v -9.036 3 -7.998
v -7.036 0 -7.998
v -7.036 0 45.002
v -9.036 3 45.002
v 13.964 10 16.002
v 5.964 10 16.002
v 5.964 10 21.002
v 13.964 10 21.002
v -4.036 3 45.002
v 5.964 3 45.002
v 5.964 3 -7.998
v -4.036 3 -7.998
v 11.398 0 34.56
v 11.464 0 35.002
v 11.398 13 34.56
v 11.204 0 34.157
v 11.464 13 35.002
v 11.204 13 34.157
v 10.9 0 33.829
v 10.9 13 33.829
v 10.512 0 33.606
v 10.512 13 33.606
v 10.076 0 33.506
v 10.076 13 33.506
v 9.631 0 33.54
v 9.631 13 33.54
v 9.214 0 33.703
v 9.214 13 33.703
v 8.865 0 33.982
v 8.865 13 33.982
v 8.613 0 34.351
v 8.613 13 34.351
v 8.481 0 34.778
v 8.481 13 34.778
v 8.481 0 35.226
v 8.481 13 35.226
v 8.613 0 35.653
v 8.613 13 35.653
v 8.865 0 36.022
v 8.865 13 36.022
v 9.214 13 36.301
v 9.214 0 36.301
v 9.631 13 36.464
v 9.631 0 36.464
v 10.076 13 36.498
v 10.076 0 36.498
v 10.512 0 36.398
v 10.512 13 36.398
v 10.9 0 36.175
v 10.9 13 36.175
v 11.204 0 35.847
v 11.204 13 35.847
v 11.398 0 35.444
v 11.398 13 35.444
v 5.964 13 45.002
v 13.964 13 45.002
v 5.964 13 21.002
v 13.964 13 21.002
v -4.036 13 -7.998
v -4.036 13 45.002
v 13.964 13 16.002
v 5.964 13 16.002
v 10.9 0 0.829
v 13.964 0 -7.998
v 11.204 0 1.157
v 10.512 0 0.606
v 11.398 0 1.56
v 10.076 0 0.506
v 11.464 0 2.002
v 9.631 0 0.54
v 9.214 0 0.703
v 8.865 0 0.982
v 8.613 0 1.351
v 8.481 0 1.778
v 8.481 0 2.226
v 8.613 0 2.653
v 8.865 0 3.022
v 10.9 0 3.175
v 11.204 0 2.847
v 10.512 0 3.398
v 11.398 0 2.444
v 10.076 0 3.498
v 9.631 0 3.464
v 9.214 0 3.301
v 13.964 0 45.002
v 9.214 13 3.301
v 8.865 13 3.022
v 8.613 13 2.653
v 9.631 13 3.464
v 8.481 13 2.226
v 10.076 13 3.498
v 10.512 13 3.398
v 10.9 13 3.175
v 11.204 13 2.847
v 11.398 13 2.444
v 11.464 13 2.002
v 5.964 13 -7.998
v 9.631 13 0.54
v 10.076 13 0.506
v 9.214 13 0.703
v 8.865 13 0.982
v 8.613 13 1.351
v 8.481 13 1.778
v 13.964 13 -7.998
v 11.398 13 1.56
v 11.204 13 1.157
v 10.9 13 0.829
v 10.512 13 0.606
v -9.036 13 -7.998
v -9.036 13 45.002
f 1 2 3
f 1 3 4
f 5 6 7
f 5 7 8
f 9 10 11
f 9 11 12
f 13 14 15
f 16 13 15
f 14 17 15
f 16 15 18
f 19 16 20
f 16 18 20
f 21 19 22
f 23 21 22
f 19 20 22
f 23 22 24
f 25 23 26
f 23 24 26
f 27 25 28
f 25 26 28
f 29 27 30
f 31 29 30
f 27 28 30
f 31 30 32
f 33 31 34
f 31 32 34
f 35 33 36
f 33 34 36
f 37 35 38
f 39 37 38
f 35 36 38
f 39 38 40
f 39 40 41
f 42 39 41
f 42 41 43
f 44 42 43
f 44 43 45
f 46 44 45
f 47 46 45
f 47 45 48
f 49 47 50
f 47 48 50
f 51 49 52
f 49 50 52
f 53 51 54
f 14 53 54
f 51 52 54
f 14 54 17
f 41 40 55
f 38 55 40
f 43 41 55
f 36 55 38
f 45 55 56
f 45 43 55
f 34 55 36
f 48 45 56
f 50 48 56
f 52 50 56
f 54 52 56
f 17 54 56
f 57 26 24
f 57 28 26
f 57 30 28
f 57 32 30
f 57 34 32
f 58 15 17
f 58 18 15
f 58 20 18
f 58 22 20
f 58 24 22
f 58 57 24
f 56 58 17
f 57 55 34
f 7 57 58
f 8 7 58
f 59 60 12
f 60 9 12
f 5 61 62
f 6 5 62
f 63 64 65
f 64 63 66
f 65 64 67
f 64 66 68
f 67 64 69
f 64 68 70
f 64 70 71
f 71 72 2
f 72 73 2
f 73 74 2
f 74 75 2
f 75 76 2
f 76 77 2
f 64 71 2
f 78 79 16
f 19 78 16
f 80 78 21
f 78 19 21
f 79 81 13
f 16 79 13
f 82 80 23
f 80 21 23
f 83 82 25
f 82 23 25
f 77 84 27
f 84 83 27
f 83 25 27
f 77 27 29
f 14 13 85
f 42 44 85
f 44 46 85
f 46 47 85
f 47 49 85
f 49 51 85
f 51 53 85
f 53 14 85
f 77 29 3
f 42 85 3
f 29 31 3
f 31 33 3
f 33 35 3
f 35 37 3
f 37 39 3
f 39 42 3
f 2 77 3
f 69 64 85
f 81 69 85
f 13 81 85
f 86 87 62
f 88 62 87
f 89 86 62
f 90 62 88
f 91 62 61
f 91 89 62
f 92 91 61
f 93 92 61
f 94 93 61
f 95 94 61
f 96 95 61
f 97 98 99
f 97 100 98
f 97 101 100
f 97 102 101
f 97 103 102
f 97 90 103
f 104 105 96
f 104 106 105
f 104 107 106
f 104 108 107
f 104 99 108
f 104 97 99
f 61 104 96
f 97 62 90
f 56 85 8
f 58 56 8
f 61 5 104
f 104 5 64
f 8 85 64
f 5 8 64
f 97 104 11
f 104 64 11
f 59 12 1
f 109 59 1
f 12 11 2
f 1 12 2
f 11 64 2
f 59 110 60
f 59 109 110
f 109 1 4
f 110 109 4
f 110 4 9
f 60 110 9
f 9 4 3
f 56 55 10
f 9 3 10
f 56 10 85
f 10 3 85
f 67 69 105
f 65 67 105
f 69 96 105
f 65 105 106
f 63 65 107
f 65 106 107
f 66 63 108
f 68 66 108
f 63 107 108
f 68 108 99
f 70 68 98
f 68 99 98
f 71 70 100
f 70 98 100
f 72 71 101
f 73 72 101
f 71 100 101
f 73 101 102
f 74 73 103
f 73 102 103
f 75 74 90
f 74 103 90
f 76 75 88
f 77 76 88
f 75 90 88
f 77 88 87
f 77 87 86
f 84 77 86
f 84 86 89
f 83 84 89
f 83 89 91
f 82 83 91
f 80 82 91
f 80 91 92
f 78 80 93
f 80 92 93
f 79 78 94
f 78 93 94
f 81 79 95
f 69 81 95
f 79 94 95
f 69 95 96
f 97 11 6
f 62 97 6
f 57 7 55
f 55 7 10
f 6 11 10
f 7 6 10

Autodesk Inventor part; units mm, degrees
ref_plane "YZ Plane" through (0, 0, 0) normal (1, 0, 0) x (0, 1, 0)
ref_plane "XZ Plane" through (0, 0, 0) normal (0, 1, 0) x (-1, 0, 0)
ref_plane "XY Plane" through (0, 0, 0) normal (0, 0, 1) x (1, 0, 0)
sketch "Boceto1" plane through (0, 0, 0) normal (0, 1, 0) x (-1, 0, 0)
  line L0 (9.0356, 45.002) -> (-13.9644, 45.002)
  line L1 (-13.9644, 45.002) -> (-13.9644, -7.998)
  line L2 (-13.9644, -7.998) -> (9.0356, -7.998)
  line L3 (9.0356, -7.998) -> (9.0356, 45.002)
  point P0 (0, 0)
  dimension "d0" = 23
  dimension "d1" = 53
extrude "Extrusión1" add sketch "Boceto1" along normal blind 3
sketch "Boceto2" plane through (0, 3, 0) normal (0, 1, 0) x (1, 0, 0)
  line L0 (-9.0356, -45.002) -> (13.9644, -45.002) projected
  line L1 (13.9644, -45.002) -> (13.9644, 7.998) projected
  line L2 (5.9644, -45.002) -> (13.9644, -45.002)
  line L3 (13.9644, -45.002) -> (13.9644, 7.998)
  line L4 (13.9644, 7.998) -> (5.9644, 7.998)
  line L5 (5.9644, 7.998) -> (5.9644, -45.002)
  point P0 (0, 0)
  dimension "d4" = 8
extrude "Extrusión2" add sketch "Boceto2" along normal blind 10
sketch "Boceto3" plane through (0, 13, 0) normal (0, 1, 0) x (1, 0, 0)
  line L0 (5.9644, 7.998) -> (5.9644, -45.002) projected
  line L1 (5.9644, -21.002) -> (13.9831, -21.002)
  line L2 (13.9831, -21.002) -> (13.9831, -16.002)
  line L3 (13.9831, -16.002) -> (5.9644, -16.002)
  line L4 (5.9644, -16.002) -> (5.9644, -21.002)
  line L5 (13.9644, 7.998) -> (5.9644, 7.998) projected
  line L6 (5.9644, -45.002) -> (13.9644, -45.002) projected
  point P0 (0, 0)
  dimension "d7" = 24
  dimension "d8" = 5
  dimension "d9" = 24
extrude "Extrusión3" cut sketch "Boceto3" against normal blind 3
sketch "Boceto4" plane through (0, 13, 0) normal (0, 1, 0) x (1, 0, 0)
  circle A0 centre (9.9644, -2.002) radius 1.5
  line L0 (13.9644, 7.998) -> (5.9644, 7.998) projected
  line L1 (13.9644, -16.002) -> (13.9644, 7.998) projected
  line L2 (13.9644, -45.002) -> (13.9644, 7.998) projected
  line L3 (13.9644, -18.502) -> (5.9644, -18.502)
  circle A1 centre (9.9644, -35.002) radius 1.5
  point P0 (0, 0)
  dimension "d12" = 3
  dimension "d13" = 10
  dimension "d14" = 4
extrude "Extrusión4" cut sketch "Boceto4" against normal blind 14.75
sketch "Boceto5" plane through (0, 3, 0) normal (0, 1, 0) x (1, 0, 0)
  line L0 (-9.0356, -45.002) -> (-4.0356, -45.002)
  line L1 (-4.0356, -45.002) -> (-4.0356, 7.998)
  line L2 (-4.0356, 7.998) -> (-9.0356, 7.998)
  line L3 (-9.0356, 7.998) -> (-9.0356, -45.002)
  point P0 (0, 0)
  dimension "d17" = 5
extrude "Extrusión5" add sketch "Boceto5" along normal blind 10
sketch "Boceto7" plane through (13.9644, 0, -7.998) normal (0, 0, -1) x (-1, 0, 0)
  line L0 (23, 0) -> (21, 0)
  line L1 (23, 0) -> (0, 0) projected
  line L2 (23, 0) -> (23, 3)
  line L3 (21, 0) -> (23, 3)
  point P0 (13.9644, 0)
  dimension "d24" = 2
  dimension "d25" = 3
extrude "Extrusión7" cut sketch "Boceto7" against normal blind 55.5
sketch "Boceto8" plane through (13.9644, 0, 45.002) normal (1, 0, 0) x (0, 0, -1)
  point P0 (45.002, 0)
equation "\"Radio_pliegue\" = Grosor"
equation "\"Anchura_desahogo_plegado\" = Grosor"
equation "\"Profundidad_desahogo_plegado\" = 0.5 * Grosor"
equation "\"Tamaño_destalonado\" = 4 * Grosor"
equation "\"Remanente_mínimo\" = 2 * Grosor"
equation "\"Radiodetransición\" = Radio_pliegue"
equation "\"Tamaño_de_radio_de_Jacobi\" = Radio_pliegue"
equation "\"TamañoSeparación\" = Grosor"
equation "\"Grosor\" = 0.5"
properties part number "PiezaAtras"
